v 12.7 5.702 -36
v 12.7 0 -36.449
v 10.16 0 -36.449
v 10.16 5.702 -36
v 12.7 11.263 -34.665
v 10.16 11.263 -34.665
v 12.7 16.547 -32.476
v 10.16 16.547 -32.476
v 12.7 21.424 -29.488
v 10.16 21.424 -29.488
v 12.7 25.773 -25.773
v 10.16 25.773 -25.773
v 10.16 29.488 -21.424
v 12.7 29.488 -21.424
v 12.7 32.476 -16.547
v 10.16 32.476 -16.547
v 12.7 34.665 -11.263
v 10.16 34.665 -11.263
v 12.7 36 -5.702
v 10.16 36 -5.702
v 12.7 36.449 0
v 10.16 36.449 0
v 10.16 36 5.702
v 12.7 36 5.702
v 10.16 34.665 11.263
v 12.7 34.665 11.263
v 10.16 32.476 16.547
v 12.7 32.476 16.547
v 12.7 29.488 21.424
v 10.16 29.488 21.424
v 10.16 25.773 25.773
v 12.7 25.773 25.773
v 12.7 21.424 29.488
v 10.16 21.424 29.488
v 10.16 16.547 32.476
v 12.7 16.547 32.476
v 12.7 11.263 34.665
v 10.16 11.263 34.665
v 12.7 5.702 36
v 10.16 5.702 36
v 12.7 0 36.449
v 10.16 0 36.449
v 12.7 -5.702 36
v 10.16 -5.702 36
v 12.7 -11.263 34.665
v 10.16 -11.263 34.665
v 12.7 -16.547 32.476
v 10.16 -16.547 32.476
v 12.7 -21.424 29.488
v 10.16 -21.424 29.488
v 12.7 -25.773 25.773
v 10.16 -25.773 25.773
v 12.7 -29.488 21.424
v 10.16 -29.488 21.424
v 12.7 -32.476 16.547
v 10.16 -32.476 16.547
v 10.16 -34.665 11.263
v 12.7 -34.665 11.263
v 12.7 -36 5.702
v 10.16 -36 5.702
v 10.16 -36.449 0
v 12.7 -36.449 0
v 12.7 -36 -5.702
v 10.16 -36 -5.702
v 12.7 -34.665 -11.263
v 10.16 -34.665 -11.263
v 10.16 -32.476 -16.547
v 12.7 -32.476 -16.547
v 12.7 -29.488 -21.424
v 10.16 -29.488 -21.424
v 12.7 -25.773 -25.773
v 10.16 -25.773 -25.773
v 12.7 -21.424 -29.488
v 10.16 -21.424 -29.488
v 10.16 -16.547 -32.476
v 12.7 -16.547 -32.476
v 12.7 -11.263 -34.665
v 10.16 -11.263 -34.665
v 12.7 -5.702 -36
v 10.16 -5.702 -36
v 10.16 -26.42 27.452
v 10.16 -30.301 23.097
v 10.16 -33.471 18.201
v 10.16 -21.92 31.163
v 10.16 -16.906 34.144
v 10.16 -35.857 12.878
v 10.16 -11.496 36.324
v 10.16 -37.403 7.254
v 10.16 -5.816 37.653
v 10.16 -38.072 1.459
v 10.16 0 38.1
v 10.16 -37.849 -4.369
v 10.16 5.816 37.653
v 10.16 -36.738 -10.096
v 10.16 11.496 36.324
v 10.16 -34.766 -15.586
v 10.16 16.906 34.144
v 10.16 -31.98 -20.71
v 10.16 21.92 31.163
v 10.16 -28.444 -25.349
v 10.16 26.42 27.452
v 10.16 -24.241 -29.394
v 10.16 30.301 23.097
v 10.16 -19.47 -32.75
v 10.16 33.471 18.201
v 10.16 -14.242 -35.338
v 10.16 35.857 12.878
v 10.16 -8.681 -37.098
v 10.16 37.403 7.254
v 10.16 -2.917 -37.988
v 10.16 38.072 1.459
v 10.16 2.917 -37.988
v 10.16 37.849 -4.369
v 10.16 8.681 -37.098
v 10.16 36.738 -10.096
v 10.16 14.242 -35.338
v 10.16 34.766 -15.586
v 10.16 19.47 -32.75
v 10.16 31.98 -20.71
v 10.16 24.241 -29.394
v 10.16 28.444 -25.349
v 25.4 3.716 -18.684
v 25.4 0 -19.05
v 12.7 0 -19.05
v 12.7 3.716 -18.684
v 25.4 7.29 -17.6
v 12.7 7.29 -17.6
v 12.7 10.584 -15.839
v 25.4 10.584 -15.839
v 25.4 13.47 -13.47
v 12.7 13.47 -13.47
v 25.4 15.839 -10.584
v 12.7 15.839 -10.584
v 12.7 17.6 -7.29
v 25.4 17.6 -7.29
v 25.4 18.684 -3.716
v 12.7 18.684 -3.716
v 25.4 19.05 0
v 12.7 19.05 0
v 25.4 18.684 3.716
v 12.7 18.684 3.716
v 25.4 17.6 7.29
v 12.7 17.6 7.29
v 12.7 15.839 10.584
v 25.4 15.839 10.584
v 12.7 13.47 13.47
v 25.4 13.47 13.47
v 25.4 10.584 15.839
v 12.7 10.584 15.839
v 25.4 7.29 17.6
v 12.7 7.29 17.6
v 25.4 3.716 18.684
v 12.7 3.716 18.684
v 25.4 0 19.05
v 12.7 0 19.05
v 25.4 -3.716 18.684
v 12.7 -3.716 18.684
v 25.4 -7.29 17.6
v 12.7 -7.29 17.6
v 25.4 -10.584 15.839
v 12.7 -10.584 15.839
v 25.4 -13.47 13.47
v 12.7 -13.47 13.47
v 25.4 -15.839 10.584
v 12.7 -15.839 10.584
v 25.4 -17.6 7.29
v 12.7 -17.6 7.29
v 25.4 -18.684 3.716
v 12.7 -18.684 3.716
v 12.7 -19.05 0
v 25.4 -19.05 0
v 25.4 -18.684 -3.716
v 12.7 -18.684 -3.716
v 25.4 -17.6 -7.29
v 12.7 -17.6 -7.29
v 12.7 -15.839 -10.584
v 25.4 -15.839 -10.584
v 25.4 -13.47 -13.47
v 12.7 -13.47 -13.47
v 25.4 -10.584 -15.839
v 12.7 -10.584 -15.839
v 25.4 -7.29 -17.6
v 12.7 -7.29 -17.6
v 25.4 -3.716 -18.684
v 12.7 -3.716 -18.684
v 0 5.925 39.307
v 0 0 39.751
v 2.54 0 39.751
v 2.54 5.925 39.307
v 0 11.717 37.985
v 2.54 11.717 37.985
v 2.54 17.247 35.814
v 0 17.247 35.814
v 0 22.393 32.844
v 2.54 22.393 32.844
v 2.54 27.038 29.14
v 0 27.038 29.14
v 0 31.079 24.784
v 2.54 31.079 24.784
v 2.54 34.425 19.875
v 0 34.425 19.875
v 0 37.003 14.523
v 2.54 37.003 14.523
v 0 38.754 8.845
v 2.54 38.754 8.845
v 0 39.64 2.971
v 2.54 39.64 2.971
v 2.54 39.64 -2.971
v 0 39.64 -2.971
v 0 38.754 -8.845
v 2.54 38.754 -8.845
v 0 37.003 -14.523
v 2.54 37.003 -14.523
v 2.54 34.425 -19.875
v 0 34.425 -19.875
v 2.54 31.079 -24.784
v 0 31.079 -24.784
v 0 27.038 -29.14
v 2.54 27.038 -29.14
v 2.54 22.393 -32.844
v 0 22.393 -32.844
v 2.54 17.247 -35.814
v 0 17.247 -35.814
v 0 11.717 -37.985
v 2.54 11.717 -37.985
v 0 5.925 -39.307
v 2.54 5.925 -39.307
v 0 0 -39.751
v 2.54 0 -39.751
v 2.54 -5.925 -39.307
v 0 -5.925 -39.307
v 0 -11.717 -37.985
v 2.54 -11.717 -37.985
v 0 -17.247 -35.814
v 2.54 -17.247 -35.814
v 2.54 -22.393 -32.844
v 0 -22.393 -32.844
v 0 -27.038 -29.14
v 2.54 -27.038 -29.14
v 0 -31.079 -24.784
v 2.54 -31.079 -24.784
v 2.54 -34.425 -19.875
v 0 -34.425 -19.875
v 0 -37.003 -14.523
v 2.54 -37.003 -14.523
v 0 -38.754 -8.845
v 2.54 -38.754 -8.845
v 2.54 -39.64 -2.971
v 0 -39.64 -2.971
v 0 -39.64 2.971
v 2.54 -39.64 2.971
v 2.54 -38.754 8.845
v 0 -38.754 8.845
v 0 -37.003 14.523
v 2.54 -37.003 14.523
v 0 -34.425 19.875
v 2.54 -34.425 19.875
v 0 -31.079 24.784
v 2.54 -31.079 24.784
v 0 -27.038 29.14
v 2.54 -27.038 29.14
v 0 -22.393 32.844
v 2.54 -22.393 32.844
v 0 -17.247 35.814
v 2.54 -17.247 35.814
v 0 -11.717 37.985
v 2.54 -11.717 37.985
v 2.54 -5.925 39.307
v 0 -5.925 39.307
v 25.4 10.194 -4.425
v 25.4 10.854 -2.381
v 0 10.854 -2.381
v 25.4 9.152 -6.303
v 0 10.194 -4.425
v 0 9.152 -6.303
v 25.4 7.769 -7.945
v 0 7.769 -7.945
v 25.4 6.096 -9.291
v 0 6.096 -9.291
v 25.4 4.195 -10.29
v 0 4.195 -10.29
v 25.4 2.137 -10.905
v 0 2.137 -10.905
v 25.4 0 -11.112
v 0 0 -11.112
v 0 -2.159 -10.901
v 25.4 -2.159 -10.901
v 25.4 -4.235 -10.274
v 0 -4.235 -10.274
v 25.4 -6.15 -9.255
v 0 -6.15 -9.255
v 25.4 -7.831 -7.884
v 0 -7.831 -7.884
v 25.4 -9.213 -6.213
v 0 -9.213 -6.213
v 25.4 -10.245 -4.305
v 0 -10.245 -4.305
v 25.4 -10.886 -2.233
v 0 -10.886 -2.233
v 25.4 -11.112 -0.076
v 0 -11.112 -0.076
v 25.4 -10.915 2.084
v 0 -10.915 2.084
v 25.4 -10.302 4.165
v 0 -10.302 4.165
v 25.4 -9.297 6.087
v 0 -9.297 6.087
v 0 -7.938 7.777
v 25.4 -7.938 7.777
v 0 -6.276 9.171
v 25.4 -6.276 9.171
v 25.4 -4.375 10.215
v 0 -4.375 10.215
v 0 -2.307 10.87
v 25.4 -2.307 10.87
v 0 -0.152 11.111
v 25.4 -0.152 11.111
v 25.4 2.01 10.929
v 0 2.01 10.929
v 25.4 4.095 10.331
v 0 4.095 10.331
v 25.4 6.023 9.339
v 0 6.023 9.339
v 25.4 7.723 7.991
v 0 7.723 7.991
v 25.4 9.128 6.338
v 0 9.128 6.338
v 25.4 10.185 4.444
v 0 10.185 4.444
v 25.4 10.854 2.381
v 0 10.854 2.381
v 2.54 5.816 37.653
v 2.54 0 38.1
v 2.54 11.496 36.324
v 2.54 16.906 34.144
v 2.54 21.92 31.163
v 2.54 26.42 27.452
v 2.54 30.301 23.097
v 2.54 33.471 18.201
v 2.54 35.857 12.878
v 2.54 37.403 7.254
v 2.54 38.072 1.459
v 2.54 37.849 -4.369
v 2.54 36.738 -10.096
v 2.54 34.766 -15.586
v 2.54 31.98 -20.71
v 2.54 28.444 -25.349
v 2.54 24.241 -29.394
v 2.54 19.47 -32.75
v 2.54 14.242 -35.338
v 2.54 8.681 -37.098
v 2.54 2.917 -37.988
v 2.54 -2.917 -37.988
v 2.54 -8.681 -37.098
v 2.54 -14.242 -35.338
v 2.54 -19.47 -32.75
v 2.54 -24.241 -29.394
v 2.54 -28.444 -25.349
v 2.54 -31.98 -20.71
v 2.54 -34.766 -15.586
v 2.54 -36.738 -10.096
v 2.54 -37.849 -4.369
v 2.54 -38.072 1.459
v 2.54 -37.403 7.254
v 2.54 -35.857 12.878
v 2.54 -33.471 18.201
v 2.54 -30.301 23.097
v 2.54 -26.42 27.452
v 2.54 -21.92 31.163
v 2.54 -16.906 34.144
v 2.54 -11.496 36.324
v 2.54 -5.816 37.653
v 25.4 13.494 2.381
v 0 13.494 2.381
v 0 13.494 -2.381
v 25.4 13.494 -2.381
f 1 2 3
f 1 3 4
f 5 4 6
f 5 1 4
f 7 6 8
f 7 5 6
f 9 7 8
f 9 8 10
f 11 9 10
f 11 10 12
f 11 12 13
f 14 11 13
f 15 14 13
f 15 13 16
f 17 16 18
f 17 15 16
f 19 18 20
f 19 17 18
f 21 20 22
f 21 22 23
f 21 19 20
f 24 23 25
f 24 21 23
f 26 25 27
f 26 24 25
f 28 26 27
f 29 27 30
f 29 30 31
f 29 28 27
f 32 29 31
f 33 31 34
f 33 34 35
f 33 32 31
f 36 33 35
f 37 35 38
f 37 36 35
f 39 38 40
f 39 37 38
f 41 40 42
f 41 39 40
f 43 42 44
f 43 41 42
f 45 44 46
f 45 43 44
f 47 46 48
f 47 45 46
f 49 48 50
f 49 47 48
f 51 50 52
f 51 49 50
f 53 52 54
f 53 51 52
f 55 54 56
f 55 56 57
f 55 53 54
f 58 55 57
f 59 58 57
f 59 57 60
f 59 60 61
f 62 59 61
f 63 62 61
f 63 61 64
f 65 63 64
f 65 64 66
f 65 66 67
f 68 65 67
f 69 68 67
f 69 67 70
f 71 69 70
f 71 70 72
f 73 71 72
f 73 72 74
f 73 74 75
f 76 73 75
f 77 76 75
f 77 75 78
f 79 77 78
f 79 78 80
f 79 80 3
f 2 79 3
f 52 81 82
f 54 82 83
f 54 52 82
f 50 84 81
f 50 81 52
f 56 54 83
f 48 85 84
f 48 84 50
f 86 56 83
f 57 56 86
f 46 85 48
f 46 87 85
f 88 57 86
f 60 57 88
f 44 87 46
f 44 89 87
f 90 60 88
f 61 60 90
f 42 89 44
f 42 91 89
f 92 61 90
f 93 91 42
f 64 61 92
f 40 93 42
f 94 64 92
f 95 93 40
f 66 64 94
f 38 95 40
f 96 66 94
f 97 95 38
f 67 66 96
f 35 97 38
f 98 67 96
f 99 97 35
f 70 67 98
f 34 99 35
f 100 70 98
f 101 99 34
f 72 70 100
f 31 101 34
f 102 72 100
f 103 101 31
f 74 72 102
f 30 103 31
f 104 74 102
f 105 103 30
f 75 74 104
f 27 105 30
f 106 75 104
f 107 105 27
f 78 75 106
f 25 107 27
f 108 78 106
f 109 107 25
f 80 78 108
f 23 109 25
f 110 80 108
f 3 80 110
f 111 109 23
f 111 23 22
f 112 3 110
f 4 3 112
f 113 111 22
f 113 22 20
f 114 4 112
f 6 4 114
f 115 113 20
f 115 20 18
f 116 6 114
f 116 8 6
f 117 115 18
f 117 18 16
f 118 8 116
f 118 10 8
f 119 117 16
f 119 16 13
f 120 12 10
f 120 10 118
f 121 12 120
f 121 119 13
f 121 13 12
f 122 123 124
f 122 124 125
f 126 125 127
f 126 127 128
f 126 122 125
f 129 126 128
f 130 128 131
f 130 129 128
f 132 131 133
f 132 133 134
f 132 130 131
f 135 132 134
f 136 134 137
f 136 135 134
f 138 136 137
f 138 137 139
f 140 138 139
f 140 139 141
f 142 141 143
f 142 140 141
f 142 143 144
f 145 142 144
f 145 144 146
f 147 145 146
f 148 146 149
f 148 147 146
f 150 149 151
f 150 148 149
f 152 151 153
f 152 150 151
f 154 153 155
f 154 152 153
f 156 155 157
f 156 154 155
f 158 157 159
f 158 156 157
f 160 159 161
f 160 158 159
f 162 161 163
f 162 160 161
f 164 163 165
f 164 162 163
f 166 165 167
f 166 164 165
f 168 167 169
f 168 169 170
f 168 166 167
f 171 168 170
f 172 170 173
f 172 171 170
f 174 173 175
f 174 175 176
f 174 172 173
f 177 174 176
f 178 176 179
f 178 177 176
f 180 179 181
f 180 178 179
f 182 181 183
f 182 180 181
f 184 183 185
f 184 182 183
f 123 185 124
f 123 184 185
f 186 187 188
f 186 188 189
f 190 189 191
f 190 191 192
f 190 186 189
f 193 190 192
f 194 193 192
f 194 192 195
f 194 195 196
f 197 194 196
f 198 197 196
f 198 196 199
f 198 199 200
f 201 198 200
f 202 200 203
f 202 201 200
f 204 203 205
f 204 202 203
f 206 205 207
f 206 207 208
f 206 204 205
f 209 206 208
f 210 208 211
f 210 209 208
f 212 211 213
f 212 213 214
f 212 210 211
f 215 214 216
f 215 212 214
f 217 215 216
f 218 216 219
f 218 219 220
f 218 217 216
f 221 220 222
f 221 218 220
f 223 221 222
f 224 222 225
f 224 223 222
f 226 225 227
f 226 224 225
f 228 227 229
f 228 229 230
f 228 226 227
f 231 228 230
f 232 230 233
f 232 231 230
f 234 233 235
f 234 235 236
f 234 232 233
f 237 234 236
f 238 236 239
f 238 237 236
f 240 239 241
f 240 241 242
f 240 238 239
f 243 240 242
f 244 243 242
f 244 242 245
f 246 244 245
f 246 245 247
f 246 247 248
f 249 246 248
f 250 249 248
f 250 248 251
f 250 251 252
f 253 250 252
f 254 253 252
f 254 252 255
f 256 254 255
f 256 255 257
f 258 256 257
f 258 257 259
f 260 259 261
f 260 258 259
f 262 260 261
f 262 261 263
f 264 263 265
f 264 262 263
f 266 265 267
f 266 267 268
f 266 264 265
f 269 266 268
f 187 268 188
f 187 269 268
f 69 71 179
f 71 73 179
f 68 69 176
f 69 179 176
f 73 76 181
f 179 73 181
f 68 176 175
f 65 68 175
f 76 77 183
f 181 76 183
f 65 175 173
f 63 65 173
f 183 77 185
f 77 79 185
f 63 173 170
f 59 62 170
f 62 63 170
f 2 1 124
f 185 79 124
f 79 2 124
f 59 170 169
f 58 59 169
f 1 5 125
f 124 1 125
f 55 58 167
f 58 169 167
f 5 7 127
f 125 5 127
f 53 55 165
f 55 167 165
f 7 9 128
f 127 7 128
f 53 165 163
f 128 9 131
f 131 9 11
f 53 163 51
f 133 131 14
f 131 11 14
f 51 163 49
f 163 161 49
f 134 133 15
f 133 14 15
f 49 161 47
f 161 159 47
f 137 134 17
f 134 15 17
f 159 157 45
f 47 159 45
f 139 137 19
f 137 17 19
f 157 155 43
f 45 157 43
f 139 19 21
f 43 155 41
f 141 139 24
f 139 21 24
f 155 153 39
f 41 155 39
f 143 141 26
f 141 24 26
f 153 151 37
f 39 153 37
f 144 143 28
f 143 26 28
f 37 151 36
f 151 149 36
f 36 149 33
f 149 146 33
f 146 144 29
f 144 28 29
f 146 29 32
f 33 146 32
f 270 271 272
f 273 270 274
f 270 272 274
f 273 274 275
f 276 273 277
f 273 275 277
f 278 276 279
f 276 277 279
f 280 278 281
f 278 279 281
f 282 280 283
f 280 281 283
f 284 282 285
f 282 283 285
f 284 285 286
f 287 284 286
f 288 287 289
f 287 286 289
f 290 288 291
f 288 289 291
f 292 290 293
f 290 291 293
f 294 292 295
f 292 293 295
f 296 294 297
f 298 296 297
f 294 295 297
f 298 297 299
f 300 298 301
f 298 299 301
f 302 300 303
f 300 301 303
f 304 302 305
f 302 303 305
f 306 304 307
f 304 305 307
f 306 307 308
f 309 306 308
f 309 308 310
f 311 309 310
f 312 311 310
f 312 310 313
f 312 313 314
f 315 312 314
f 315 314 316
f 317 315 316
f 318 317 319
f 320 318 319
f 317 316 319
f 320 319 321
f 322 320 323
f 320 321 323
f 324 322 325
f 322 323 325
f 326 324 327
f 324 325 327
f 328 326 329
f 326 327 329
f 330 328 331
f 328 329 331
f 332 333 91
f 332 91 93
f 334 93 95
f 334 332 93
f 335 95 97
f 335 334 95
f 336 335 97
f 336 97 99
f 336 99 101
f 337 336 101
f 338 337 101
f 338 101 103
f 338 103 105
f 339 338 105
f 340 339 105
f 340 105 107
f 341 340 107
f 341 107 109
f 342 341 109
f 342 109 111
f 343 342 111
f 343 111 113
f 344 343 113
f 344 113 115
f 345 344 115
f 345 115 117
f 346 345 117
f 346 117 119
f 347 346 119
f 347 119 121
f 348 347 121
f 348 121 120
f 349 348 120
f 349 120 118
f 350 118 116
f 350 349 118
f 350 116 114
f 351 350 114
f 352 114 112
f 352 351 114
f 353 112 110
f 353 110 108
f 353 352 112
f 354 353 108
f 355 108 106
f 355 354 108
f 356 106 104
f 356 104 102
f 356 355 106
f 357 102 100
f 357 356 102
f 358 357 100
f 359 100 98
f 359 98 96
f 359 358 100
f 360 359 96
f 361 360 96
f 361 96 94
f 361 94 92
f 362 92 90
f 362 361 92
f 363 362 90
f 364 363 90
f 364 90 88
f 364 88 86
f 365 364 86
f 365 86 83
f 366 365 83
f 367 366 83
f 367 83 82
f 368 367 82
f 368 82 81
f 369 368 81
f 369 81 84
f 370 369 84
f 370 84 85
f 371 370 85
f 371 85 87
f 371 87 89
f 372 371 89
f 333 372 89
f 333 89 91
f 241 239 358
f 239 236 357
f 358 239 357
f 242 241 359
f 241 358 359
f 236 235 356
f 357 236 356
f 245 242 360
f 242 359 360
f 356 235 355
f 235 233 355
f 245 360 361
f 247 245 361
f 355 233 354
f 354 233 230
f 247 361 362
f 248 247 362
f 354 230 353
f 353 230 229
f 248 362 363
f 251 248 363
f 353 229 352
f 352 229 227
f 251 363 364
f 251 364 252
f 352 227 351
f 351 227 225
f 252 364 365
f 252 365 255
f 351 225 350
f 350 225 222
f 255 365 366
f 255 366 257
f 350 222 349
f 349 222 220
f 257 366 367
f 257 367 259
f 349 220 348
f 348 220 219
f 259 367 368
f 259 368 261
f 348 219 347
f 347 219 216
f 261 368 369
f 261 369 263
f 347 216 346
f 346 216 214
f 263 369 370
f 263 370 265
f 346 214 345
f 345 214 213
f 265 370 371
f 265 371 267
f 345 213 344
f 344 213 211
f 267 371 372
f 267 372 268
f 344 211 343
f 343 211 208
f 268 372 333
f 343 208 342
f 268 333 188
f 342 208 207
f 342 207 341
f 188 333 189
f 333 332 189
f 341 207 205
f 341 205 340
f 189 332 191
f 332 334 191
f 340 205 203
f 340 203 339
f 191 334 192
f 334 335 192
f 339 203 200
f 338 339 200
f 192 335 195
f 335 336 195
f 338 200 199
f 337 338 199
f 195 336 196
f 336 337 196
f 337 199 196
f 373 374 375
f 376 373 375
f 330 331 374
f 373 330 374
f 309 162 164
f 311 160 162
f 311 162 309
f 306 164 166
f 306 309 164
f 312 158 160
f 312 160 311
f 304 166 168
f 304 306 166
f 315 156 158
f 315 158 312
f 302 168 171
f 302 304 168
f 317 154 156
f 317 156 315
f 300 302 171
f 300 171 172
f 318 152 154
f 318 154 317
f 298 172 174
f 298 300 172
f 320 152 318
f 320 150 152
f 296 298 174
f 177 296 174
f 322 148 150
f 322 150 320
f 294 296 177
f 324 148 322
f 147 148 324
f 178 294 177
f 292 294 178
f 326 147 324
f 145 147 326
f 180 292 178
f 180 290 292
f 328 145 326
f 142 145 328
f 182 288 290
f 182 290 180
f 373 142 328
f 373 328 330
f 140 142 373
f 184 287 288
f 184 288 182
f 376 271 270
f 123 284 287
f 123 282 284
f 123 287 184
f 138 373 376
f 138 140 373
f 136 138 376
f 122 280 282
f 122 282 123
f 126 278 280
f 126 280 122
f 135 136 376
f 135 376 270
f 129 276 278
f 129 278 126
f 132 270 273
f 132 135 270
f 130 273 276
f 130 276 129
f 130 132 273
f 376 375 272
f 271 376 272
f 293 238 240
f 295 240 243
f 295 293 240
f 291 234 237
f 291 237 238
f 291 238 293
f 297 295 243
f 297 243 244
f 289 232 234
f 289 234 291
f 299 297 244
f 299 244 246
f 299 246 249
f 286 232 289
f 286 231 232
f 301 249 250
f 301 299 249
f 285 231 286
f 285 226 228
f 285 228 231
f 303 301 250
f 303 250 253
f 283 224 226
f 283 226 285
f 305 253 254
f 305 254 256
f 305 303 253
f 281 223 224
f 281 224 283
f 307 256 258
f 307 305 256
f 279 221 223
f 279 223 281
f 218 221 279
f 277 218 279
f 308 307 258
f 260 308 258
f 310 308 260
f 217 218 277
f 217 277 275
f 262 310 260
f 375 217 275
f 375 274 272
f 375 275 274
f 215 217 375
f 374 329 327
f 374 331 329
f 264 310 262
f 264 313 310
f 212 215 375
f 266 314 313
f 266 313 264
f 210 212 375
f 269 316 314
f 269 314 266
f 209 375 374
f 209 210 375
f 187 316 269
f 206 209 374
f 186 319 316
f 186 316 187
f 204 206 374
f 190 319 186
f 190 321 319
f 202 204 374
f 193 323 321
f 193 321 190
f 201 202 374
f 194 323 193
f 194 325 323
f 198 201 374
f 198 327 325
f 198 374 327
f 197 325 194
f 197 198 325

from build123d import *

# Parameters (mm, degrees)
SKETCH1_R           = 25.4
BOSS_EXTRUDE1_DEPTH = 25.4
SKETCH2_R           = 38.1
SKETCH2_R_2         = 19.05
BOSS_EXTRUDE2_DEPTH = 12.7
SKETCH3_R           = 25.4
SKETCH3_R_2         = 19.05
CUT_EXTRUDE1_DEPTH  = 12.7
SKETCH5_R           = 39.751
SKETCH5_R_2         = 38.1
BOSS_EXTRUDE3_DEPTH = 2.54
SKETCH6_R           = 38.1
SKETCH6_R_2         = 36.449
CUT_EXTRUDE3_DEPTH  = 2.54


with BuildPart() as part:
    # Sketch1 → Boss-Extrude1 (new body)
    with BuildSketch(Plane(origin=(0, 0, 0), x_dir=(0, 0, -1), z_dir=(1, 0, 0))):
        Circle(SKETCH1_R)
        with BuildLine():
            Line((-2.38125, 10.854368), (-2.38125, 13.49375))
            Line((-2.38125, 13.49375), (2.38125, 13.49375))
            Line((2.38125, 13.49375), (2.38125, 10.854368))
            ThreePointArc((2.38125, 10.854368), (8.658790241, 6.965127982), (11.1125, 0))
            ThreePointArc((11.1125, 0), (-6.965127982, -8.658790241), (-2.38125, 10.854368))
        make_face(mode=Mode.SUBTRACT)
    extrude(amount=BOSS_EXTRUDE1_DEPTH)

    # Sketch2 → Boss-Extrude2 (add)
    with BuildSketch(Plane.ZY):
        Circle(SKETCH2_R)
        Circle(SKETCH2_R_2, mode=Mode.SUBTRACT)
    extrude(amount=-BOSS_EXTRUDE2_DEPTH)

    # Sketch3 → Cut-Extrude1 (cut)
    with BuildSketch(Plane(origin=(25.4, 0, 0), x_dir=(0, 0, -1), z_dir=(1, 0, 0))):
        Circle(SKETCH3_R)
        Circle(SKETCH3_R_2, mode=Mode.SUBTRACT)
    extrude(amount=-CUT_EXTRUDE1_DEPTH, mode=Mode.SUBTRACT)

    # Sketch5 → Boss-Extrude3 (add)
    with BuildSketch(Plane.ZY):
        Circle(SKETCH5_R)
        Circle(SKETCH5_R_2, mode=Mode.SUBTRACT)
    extrude(amount=-BOSS_EXTRUDE3_DEPTH)

    # Sketch6 → Cut-Extrude3 (cut)
    with BuildSketch(Plane(origin=(12.7, 0, 0), x_dir=(0, 0, -1), z_dir=(1, 0, 0))):
        Circle(SKETCH6_R)
        Circle(SKETCH6_R_2, mode=Mode.SUBTRACT)
    extrude(amount=-CUT_EXTRUDE3_DEPTH, mode=Mode.SUBTRACT)


solid = part.part
